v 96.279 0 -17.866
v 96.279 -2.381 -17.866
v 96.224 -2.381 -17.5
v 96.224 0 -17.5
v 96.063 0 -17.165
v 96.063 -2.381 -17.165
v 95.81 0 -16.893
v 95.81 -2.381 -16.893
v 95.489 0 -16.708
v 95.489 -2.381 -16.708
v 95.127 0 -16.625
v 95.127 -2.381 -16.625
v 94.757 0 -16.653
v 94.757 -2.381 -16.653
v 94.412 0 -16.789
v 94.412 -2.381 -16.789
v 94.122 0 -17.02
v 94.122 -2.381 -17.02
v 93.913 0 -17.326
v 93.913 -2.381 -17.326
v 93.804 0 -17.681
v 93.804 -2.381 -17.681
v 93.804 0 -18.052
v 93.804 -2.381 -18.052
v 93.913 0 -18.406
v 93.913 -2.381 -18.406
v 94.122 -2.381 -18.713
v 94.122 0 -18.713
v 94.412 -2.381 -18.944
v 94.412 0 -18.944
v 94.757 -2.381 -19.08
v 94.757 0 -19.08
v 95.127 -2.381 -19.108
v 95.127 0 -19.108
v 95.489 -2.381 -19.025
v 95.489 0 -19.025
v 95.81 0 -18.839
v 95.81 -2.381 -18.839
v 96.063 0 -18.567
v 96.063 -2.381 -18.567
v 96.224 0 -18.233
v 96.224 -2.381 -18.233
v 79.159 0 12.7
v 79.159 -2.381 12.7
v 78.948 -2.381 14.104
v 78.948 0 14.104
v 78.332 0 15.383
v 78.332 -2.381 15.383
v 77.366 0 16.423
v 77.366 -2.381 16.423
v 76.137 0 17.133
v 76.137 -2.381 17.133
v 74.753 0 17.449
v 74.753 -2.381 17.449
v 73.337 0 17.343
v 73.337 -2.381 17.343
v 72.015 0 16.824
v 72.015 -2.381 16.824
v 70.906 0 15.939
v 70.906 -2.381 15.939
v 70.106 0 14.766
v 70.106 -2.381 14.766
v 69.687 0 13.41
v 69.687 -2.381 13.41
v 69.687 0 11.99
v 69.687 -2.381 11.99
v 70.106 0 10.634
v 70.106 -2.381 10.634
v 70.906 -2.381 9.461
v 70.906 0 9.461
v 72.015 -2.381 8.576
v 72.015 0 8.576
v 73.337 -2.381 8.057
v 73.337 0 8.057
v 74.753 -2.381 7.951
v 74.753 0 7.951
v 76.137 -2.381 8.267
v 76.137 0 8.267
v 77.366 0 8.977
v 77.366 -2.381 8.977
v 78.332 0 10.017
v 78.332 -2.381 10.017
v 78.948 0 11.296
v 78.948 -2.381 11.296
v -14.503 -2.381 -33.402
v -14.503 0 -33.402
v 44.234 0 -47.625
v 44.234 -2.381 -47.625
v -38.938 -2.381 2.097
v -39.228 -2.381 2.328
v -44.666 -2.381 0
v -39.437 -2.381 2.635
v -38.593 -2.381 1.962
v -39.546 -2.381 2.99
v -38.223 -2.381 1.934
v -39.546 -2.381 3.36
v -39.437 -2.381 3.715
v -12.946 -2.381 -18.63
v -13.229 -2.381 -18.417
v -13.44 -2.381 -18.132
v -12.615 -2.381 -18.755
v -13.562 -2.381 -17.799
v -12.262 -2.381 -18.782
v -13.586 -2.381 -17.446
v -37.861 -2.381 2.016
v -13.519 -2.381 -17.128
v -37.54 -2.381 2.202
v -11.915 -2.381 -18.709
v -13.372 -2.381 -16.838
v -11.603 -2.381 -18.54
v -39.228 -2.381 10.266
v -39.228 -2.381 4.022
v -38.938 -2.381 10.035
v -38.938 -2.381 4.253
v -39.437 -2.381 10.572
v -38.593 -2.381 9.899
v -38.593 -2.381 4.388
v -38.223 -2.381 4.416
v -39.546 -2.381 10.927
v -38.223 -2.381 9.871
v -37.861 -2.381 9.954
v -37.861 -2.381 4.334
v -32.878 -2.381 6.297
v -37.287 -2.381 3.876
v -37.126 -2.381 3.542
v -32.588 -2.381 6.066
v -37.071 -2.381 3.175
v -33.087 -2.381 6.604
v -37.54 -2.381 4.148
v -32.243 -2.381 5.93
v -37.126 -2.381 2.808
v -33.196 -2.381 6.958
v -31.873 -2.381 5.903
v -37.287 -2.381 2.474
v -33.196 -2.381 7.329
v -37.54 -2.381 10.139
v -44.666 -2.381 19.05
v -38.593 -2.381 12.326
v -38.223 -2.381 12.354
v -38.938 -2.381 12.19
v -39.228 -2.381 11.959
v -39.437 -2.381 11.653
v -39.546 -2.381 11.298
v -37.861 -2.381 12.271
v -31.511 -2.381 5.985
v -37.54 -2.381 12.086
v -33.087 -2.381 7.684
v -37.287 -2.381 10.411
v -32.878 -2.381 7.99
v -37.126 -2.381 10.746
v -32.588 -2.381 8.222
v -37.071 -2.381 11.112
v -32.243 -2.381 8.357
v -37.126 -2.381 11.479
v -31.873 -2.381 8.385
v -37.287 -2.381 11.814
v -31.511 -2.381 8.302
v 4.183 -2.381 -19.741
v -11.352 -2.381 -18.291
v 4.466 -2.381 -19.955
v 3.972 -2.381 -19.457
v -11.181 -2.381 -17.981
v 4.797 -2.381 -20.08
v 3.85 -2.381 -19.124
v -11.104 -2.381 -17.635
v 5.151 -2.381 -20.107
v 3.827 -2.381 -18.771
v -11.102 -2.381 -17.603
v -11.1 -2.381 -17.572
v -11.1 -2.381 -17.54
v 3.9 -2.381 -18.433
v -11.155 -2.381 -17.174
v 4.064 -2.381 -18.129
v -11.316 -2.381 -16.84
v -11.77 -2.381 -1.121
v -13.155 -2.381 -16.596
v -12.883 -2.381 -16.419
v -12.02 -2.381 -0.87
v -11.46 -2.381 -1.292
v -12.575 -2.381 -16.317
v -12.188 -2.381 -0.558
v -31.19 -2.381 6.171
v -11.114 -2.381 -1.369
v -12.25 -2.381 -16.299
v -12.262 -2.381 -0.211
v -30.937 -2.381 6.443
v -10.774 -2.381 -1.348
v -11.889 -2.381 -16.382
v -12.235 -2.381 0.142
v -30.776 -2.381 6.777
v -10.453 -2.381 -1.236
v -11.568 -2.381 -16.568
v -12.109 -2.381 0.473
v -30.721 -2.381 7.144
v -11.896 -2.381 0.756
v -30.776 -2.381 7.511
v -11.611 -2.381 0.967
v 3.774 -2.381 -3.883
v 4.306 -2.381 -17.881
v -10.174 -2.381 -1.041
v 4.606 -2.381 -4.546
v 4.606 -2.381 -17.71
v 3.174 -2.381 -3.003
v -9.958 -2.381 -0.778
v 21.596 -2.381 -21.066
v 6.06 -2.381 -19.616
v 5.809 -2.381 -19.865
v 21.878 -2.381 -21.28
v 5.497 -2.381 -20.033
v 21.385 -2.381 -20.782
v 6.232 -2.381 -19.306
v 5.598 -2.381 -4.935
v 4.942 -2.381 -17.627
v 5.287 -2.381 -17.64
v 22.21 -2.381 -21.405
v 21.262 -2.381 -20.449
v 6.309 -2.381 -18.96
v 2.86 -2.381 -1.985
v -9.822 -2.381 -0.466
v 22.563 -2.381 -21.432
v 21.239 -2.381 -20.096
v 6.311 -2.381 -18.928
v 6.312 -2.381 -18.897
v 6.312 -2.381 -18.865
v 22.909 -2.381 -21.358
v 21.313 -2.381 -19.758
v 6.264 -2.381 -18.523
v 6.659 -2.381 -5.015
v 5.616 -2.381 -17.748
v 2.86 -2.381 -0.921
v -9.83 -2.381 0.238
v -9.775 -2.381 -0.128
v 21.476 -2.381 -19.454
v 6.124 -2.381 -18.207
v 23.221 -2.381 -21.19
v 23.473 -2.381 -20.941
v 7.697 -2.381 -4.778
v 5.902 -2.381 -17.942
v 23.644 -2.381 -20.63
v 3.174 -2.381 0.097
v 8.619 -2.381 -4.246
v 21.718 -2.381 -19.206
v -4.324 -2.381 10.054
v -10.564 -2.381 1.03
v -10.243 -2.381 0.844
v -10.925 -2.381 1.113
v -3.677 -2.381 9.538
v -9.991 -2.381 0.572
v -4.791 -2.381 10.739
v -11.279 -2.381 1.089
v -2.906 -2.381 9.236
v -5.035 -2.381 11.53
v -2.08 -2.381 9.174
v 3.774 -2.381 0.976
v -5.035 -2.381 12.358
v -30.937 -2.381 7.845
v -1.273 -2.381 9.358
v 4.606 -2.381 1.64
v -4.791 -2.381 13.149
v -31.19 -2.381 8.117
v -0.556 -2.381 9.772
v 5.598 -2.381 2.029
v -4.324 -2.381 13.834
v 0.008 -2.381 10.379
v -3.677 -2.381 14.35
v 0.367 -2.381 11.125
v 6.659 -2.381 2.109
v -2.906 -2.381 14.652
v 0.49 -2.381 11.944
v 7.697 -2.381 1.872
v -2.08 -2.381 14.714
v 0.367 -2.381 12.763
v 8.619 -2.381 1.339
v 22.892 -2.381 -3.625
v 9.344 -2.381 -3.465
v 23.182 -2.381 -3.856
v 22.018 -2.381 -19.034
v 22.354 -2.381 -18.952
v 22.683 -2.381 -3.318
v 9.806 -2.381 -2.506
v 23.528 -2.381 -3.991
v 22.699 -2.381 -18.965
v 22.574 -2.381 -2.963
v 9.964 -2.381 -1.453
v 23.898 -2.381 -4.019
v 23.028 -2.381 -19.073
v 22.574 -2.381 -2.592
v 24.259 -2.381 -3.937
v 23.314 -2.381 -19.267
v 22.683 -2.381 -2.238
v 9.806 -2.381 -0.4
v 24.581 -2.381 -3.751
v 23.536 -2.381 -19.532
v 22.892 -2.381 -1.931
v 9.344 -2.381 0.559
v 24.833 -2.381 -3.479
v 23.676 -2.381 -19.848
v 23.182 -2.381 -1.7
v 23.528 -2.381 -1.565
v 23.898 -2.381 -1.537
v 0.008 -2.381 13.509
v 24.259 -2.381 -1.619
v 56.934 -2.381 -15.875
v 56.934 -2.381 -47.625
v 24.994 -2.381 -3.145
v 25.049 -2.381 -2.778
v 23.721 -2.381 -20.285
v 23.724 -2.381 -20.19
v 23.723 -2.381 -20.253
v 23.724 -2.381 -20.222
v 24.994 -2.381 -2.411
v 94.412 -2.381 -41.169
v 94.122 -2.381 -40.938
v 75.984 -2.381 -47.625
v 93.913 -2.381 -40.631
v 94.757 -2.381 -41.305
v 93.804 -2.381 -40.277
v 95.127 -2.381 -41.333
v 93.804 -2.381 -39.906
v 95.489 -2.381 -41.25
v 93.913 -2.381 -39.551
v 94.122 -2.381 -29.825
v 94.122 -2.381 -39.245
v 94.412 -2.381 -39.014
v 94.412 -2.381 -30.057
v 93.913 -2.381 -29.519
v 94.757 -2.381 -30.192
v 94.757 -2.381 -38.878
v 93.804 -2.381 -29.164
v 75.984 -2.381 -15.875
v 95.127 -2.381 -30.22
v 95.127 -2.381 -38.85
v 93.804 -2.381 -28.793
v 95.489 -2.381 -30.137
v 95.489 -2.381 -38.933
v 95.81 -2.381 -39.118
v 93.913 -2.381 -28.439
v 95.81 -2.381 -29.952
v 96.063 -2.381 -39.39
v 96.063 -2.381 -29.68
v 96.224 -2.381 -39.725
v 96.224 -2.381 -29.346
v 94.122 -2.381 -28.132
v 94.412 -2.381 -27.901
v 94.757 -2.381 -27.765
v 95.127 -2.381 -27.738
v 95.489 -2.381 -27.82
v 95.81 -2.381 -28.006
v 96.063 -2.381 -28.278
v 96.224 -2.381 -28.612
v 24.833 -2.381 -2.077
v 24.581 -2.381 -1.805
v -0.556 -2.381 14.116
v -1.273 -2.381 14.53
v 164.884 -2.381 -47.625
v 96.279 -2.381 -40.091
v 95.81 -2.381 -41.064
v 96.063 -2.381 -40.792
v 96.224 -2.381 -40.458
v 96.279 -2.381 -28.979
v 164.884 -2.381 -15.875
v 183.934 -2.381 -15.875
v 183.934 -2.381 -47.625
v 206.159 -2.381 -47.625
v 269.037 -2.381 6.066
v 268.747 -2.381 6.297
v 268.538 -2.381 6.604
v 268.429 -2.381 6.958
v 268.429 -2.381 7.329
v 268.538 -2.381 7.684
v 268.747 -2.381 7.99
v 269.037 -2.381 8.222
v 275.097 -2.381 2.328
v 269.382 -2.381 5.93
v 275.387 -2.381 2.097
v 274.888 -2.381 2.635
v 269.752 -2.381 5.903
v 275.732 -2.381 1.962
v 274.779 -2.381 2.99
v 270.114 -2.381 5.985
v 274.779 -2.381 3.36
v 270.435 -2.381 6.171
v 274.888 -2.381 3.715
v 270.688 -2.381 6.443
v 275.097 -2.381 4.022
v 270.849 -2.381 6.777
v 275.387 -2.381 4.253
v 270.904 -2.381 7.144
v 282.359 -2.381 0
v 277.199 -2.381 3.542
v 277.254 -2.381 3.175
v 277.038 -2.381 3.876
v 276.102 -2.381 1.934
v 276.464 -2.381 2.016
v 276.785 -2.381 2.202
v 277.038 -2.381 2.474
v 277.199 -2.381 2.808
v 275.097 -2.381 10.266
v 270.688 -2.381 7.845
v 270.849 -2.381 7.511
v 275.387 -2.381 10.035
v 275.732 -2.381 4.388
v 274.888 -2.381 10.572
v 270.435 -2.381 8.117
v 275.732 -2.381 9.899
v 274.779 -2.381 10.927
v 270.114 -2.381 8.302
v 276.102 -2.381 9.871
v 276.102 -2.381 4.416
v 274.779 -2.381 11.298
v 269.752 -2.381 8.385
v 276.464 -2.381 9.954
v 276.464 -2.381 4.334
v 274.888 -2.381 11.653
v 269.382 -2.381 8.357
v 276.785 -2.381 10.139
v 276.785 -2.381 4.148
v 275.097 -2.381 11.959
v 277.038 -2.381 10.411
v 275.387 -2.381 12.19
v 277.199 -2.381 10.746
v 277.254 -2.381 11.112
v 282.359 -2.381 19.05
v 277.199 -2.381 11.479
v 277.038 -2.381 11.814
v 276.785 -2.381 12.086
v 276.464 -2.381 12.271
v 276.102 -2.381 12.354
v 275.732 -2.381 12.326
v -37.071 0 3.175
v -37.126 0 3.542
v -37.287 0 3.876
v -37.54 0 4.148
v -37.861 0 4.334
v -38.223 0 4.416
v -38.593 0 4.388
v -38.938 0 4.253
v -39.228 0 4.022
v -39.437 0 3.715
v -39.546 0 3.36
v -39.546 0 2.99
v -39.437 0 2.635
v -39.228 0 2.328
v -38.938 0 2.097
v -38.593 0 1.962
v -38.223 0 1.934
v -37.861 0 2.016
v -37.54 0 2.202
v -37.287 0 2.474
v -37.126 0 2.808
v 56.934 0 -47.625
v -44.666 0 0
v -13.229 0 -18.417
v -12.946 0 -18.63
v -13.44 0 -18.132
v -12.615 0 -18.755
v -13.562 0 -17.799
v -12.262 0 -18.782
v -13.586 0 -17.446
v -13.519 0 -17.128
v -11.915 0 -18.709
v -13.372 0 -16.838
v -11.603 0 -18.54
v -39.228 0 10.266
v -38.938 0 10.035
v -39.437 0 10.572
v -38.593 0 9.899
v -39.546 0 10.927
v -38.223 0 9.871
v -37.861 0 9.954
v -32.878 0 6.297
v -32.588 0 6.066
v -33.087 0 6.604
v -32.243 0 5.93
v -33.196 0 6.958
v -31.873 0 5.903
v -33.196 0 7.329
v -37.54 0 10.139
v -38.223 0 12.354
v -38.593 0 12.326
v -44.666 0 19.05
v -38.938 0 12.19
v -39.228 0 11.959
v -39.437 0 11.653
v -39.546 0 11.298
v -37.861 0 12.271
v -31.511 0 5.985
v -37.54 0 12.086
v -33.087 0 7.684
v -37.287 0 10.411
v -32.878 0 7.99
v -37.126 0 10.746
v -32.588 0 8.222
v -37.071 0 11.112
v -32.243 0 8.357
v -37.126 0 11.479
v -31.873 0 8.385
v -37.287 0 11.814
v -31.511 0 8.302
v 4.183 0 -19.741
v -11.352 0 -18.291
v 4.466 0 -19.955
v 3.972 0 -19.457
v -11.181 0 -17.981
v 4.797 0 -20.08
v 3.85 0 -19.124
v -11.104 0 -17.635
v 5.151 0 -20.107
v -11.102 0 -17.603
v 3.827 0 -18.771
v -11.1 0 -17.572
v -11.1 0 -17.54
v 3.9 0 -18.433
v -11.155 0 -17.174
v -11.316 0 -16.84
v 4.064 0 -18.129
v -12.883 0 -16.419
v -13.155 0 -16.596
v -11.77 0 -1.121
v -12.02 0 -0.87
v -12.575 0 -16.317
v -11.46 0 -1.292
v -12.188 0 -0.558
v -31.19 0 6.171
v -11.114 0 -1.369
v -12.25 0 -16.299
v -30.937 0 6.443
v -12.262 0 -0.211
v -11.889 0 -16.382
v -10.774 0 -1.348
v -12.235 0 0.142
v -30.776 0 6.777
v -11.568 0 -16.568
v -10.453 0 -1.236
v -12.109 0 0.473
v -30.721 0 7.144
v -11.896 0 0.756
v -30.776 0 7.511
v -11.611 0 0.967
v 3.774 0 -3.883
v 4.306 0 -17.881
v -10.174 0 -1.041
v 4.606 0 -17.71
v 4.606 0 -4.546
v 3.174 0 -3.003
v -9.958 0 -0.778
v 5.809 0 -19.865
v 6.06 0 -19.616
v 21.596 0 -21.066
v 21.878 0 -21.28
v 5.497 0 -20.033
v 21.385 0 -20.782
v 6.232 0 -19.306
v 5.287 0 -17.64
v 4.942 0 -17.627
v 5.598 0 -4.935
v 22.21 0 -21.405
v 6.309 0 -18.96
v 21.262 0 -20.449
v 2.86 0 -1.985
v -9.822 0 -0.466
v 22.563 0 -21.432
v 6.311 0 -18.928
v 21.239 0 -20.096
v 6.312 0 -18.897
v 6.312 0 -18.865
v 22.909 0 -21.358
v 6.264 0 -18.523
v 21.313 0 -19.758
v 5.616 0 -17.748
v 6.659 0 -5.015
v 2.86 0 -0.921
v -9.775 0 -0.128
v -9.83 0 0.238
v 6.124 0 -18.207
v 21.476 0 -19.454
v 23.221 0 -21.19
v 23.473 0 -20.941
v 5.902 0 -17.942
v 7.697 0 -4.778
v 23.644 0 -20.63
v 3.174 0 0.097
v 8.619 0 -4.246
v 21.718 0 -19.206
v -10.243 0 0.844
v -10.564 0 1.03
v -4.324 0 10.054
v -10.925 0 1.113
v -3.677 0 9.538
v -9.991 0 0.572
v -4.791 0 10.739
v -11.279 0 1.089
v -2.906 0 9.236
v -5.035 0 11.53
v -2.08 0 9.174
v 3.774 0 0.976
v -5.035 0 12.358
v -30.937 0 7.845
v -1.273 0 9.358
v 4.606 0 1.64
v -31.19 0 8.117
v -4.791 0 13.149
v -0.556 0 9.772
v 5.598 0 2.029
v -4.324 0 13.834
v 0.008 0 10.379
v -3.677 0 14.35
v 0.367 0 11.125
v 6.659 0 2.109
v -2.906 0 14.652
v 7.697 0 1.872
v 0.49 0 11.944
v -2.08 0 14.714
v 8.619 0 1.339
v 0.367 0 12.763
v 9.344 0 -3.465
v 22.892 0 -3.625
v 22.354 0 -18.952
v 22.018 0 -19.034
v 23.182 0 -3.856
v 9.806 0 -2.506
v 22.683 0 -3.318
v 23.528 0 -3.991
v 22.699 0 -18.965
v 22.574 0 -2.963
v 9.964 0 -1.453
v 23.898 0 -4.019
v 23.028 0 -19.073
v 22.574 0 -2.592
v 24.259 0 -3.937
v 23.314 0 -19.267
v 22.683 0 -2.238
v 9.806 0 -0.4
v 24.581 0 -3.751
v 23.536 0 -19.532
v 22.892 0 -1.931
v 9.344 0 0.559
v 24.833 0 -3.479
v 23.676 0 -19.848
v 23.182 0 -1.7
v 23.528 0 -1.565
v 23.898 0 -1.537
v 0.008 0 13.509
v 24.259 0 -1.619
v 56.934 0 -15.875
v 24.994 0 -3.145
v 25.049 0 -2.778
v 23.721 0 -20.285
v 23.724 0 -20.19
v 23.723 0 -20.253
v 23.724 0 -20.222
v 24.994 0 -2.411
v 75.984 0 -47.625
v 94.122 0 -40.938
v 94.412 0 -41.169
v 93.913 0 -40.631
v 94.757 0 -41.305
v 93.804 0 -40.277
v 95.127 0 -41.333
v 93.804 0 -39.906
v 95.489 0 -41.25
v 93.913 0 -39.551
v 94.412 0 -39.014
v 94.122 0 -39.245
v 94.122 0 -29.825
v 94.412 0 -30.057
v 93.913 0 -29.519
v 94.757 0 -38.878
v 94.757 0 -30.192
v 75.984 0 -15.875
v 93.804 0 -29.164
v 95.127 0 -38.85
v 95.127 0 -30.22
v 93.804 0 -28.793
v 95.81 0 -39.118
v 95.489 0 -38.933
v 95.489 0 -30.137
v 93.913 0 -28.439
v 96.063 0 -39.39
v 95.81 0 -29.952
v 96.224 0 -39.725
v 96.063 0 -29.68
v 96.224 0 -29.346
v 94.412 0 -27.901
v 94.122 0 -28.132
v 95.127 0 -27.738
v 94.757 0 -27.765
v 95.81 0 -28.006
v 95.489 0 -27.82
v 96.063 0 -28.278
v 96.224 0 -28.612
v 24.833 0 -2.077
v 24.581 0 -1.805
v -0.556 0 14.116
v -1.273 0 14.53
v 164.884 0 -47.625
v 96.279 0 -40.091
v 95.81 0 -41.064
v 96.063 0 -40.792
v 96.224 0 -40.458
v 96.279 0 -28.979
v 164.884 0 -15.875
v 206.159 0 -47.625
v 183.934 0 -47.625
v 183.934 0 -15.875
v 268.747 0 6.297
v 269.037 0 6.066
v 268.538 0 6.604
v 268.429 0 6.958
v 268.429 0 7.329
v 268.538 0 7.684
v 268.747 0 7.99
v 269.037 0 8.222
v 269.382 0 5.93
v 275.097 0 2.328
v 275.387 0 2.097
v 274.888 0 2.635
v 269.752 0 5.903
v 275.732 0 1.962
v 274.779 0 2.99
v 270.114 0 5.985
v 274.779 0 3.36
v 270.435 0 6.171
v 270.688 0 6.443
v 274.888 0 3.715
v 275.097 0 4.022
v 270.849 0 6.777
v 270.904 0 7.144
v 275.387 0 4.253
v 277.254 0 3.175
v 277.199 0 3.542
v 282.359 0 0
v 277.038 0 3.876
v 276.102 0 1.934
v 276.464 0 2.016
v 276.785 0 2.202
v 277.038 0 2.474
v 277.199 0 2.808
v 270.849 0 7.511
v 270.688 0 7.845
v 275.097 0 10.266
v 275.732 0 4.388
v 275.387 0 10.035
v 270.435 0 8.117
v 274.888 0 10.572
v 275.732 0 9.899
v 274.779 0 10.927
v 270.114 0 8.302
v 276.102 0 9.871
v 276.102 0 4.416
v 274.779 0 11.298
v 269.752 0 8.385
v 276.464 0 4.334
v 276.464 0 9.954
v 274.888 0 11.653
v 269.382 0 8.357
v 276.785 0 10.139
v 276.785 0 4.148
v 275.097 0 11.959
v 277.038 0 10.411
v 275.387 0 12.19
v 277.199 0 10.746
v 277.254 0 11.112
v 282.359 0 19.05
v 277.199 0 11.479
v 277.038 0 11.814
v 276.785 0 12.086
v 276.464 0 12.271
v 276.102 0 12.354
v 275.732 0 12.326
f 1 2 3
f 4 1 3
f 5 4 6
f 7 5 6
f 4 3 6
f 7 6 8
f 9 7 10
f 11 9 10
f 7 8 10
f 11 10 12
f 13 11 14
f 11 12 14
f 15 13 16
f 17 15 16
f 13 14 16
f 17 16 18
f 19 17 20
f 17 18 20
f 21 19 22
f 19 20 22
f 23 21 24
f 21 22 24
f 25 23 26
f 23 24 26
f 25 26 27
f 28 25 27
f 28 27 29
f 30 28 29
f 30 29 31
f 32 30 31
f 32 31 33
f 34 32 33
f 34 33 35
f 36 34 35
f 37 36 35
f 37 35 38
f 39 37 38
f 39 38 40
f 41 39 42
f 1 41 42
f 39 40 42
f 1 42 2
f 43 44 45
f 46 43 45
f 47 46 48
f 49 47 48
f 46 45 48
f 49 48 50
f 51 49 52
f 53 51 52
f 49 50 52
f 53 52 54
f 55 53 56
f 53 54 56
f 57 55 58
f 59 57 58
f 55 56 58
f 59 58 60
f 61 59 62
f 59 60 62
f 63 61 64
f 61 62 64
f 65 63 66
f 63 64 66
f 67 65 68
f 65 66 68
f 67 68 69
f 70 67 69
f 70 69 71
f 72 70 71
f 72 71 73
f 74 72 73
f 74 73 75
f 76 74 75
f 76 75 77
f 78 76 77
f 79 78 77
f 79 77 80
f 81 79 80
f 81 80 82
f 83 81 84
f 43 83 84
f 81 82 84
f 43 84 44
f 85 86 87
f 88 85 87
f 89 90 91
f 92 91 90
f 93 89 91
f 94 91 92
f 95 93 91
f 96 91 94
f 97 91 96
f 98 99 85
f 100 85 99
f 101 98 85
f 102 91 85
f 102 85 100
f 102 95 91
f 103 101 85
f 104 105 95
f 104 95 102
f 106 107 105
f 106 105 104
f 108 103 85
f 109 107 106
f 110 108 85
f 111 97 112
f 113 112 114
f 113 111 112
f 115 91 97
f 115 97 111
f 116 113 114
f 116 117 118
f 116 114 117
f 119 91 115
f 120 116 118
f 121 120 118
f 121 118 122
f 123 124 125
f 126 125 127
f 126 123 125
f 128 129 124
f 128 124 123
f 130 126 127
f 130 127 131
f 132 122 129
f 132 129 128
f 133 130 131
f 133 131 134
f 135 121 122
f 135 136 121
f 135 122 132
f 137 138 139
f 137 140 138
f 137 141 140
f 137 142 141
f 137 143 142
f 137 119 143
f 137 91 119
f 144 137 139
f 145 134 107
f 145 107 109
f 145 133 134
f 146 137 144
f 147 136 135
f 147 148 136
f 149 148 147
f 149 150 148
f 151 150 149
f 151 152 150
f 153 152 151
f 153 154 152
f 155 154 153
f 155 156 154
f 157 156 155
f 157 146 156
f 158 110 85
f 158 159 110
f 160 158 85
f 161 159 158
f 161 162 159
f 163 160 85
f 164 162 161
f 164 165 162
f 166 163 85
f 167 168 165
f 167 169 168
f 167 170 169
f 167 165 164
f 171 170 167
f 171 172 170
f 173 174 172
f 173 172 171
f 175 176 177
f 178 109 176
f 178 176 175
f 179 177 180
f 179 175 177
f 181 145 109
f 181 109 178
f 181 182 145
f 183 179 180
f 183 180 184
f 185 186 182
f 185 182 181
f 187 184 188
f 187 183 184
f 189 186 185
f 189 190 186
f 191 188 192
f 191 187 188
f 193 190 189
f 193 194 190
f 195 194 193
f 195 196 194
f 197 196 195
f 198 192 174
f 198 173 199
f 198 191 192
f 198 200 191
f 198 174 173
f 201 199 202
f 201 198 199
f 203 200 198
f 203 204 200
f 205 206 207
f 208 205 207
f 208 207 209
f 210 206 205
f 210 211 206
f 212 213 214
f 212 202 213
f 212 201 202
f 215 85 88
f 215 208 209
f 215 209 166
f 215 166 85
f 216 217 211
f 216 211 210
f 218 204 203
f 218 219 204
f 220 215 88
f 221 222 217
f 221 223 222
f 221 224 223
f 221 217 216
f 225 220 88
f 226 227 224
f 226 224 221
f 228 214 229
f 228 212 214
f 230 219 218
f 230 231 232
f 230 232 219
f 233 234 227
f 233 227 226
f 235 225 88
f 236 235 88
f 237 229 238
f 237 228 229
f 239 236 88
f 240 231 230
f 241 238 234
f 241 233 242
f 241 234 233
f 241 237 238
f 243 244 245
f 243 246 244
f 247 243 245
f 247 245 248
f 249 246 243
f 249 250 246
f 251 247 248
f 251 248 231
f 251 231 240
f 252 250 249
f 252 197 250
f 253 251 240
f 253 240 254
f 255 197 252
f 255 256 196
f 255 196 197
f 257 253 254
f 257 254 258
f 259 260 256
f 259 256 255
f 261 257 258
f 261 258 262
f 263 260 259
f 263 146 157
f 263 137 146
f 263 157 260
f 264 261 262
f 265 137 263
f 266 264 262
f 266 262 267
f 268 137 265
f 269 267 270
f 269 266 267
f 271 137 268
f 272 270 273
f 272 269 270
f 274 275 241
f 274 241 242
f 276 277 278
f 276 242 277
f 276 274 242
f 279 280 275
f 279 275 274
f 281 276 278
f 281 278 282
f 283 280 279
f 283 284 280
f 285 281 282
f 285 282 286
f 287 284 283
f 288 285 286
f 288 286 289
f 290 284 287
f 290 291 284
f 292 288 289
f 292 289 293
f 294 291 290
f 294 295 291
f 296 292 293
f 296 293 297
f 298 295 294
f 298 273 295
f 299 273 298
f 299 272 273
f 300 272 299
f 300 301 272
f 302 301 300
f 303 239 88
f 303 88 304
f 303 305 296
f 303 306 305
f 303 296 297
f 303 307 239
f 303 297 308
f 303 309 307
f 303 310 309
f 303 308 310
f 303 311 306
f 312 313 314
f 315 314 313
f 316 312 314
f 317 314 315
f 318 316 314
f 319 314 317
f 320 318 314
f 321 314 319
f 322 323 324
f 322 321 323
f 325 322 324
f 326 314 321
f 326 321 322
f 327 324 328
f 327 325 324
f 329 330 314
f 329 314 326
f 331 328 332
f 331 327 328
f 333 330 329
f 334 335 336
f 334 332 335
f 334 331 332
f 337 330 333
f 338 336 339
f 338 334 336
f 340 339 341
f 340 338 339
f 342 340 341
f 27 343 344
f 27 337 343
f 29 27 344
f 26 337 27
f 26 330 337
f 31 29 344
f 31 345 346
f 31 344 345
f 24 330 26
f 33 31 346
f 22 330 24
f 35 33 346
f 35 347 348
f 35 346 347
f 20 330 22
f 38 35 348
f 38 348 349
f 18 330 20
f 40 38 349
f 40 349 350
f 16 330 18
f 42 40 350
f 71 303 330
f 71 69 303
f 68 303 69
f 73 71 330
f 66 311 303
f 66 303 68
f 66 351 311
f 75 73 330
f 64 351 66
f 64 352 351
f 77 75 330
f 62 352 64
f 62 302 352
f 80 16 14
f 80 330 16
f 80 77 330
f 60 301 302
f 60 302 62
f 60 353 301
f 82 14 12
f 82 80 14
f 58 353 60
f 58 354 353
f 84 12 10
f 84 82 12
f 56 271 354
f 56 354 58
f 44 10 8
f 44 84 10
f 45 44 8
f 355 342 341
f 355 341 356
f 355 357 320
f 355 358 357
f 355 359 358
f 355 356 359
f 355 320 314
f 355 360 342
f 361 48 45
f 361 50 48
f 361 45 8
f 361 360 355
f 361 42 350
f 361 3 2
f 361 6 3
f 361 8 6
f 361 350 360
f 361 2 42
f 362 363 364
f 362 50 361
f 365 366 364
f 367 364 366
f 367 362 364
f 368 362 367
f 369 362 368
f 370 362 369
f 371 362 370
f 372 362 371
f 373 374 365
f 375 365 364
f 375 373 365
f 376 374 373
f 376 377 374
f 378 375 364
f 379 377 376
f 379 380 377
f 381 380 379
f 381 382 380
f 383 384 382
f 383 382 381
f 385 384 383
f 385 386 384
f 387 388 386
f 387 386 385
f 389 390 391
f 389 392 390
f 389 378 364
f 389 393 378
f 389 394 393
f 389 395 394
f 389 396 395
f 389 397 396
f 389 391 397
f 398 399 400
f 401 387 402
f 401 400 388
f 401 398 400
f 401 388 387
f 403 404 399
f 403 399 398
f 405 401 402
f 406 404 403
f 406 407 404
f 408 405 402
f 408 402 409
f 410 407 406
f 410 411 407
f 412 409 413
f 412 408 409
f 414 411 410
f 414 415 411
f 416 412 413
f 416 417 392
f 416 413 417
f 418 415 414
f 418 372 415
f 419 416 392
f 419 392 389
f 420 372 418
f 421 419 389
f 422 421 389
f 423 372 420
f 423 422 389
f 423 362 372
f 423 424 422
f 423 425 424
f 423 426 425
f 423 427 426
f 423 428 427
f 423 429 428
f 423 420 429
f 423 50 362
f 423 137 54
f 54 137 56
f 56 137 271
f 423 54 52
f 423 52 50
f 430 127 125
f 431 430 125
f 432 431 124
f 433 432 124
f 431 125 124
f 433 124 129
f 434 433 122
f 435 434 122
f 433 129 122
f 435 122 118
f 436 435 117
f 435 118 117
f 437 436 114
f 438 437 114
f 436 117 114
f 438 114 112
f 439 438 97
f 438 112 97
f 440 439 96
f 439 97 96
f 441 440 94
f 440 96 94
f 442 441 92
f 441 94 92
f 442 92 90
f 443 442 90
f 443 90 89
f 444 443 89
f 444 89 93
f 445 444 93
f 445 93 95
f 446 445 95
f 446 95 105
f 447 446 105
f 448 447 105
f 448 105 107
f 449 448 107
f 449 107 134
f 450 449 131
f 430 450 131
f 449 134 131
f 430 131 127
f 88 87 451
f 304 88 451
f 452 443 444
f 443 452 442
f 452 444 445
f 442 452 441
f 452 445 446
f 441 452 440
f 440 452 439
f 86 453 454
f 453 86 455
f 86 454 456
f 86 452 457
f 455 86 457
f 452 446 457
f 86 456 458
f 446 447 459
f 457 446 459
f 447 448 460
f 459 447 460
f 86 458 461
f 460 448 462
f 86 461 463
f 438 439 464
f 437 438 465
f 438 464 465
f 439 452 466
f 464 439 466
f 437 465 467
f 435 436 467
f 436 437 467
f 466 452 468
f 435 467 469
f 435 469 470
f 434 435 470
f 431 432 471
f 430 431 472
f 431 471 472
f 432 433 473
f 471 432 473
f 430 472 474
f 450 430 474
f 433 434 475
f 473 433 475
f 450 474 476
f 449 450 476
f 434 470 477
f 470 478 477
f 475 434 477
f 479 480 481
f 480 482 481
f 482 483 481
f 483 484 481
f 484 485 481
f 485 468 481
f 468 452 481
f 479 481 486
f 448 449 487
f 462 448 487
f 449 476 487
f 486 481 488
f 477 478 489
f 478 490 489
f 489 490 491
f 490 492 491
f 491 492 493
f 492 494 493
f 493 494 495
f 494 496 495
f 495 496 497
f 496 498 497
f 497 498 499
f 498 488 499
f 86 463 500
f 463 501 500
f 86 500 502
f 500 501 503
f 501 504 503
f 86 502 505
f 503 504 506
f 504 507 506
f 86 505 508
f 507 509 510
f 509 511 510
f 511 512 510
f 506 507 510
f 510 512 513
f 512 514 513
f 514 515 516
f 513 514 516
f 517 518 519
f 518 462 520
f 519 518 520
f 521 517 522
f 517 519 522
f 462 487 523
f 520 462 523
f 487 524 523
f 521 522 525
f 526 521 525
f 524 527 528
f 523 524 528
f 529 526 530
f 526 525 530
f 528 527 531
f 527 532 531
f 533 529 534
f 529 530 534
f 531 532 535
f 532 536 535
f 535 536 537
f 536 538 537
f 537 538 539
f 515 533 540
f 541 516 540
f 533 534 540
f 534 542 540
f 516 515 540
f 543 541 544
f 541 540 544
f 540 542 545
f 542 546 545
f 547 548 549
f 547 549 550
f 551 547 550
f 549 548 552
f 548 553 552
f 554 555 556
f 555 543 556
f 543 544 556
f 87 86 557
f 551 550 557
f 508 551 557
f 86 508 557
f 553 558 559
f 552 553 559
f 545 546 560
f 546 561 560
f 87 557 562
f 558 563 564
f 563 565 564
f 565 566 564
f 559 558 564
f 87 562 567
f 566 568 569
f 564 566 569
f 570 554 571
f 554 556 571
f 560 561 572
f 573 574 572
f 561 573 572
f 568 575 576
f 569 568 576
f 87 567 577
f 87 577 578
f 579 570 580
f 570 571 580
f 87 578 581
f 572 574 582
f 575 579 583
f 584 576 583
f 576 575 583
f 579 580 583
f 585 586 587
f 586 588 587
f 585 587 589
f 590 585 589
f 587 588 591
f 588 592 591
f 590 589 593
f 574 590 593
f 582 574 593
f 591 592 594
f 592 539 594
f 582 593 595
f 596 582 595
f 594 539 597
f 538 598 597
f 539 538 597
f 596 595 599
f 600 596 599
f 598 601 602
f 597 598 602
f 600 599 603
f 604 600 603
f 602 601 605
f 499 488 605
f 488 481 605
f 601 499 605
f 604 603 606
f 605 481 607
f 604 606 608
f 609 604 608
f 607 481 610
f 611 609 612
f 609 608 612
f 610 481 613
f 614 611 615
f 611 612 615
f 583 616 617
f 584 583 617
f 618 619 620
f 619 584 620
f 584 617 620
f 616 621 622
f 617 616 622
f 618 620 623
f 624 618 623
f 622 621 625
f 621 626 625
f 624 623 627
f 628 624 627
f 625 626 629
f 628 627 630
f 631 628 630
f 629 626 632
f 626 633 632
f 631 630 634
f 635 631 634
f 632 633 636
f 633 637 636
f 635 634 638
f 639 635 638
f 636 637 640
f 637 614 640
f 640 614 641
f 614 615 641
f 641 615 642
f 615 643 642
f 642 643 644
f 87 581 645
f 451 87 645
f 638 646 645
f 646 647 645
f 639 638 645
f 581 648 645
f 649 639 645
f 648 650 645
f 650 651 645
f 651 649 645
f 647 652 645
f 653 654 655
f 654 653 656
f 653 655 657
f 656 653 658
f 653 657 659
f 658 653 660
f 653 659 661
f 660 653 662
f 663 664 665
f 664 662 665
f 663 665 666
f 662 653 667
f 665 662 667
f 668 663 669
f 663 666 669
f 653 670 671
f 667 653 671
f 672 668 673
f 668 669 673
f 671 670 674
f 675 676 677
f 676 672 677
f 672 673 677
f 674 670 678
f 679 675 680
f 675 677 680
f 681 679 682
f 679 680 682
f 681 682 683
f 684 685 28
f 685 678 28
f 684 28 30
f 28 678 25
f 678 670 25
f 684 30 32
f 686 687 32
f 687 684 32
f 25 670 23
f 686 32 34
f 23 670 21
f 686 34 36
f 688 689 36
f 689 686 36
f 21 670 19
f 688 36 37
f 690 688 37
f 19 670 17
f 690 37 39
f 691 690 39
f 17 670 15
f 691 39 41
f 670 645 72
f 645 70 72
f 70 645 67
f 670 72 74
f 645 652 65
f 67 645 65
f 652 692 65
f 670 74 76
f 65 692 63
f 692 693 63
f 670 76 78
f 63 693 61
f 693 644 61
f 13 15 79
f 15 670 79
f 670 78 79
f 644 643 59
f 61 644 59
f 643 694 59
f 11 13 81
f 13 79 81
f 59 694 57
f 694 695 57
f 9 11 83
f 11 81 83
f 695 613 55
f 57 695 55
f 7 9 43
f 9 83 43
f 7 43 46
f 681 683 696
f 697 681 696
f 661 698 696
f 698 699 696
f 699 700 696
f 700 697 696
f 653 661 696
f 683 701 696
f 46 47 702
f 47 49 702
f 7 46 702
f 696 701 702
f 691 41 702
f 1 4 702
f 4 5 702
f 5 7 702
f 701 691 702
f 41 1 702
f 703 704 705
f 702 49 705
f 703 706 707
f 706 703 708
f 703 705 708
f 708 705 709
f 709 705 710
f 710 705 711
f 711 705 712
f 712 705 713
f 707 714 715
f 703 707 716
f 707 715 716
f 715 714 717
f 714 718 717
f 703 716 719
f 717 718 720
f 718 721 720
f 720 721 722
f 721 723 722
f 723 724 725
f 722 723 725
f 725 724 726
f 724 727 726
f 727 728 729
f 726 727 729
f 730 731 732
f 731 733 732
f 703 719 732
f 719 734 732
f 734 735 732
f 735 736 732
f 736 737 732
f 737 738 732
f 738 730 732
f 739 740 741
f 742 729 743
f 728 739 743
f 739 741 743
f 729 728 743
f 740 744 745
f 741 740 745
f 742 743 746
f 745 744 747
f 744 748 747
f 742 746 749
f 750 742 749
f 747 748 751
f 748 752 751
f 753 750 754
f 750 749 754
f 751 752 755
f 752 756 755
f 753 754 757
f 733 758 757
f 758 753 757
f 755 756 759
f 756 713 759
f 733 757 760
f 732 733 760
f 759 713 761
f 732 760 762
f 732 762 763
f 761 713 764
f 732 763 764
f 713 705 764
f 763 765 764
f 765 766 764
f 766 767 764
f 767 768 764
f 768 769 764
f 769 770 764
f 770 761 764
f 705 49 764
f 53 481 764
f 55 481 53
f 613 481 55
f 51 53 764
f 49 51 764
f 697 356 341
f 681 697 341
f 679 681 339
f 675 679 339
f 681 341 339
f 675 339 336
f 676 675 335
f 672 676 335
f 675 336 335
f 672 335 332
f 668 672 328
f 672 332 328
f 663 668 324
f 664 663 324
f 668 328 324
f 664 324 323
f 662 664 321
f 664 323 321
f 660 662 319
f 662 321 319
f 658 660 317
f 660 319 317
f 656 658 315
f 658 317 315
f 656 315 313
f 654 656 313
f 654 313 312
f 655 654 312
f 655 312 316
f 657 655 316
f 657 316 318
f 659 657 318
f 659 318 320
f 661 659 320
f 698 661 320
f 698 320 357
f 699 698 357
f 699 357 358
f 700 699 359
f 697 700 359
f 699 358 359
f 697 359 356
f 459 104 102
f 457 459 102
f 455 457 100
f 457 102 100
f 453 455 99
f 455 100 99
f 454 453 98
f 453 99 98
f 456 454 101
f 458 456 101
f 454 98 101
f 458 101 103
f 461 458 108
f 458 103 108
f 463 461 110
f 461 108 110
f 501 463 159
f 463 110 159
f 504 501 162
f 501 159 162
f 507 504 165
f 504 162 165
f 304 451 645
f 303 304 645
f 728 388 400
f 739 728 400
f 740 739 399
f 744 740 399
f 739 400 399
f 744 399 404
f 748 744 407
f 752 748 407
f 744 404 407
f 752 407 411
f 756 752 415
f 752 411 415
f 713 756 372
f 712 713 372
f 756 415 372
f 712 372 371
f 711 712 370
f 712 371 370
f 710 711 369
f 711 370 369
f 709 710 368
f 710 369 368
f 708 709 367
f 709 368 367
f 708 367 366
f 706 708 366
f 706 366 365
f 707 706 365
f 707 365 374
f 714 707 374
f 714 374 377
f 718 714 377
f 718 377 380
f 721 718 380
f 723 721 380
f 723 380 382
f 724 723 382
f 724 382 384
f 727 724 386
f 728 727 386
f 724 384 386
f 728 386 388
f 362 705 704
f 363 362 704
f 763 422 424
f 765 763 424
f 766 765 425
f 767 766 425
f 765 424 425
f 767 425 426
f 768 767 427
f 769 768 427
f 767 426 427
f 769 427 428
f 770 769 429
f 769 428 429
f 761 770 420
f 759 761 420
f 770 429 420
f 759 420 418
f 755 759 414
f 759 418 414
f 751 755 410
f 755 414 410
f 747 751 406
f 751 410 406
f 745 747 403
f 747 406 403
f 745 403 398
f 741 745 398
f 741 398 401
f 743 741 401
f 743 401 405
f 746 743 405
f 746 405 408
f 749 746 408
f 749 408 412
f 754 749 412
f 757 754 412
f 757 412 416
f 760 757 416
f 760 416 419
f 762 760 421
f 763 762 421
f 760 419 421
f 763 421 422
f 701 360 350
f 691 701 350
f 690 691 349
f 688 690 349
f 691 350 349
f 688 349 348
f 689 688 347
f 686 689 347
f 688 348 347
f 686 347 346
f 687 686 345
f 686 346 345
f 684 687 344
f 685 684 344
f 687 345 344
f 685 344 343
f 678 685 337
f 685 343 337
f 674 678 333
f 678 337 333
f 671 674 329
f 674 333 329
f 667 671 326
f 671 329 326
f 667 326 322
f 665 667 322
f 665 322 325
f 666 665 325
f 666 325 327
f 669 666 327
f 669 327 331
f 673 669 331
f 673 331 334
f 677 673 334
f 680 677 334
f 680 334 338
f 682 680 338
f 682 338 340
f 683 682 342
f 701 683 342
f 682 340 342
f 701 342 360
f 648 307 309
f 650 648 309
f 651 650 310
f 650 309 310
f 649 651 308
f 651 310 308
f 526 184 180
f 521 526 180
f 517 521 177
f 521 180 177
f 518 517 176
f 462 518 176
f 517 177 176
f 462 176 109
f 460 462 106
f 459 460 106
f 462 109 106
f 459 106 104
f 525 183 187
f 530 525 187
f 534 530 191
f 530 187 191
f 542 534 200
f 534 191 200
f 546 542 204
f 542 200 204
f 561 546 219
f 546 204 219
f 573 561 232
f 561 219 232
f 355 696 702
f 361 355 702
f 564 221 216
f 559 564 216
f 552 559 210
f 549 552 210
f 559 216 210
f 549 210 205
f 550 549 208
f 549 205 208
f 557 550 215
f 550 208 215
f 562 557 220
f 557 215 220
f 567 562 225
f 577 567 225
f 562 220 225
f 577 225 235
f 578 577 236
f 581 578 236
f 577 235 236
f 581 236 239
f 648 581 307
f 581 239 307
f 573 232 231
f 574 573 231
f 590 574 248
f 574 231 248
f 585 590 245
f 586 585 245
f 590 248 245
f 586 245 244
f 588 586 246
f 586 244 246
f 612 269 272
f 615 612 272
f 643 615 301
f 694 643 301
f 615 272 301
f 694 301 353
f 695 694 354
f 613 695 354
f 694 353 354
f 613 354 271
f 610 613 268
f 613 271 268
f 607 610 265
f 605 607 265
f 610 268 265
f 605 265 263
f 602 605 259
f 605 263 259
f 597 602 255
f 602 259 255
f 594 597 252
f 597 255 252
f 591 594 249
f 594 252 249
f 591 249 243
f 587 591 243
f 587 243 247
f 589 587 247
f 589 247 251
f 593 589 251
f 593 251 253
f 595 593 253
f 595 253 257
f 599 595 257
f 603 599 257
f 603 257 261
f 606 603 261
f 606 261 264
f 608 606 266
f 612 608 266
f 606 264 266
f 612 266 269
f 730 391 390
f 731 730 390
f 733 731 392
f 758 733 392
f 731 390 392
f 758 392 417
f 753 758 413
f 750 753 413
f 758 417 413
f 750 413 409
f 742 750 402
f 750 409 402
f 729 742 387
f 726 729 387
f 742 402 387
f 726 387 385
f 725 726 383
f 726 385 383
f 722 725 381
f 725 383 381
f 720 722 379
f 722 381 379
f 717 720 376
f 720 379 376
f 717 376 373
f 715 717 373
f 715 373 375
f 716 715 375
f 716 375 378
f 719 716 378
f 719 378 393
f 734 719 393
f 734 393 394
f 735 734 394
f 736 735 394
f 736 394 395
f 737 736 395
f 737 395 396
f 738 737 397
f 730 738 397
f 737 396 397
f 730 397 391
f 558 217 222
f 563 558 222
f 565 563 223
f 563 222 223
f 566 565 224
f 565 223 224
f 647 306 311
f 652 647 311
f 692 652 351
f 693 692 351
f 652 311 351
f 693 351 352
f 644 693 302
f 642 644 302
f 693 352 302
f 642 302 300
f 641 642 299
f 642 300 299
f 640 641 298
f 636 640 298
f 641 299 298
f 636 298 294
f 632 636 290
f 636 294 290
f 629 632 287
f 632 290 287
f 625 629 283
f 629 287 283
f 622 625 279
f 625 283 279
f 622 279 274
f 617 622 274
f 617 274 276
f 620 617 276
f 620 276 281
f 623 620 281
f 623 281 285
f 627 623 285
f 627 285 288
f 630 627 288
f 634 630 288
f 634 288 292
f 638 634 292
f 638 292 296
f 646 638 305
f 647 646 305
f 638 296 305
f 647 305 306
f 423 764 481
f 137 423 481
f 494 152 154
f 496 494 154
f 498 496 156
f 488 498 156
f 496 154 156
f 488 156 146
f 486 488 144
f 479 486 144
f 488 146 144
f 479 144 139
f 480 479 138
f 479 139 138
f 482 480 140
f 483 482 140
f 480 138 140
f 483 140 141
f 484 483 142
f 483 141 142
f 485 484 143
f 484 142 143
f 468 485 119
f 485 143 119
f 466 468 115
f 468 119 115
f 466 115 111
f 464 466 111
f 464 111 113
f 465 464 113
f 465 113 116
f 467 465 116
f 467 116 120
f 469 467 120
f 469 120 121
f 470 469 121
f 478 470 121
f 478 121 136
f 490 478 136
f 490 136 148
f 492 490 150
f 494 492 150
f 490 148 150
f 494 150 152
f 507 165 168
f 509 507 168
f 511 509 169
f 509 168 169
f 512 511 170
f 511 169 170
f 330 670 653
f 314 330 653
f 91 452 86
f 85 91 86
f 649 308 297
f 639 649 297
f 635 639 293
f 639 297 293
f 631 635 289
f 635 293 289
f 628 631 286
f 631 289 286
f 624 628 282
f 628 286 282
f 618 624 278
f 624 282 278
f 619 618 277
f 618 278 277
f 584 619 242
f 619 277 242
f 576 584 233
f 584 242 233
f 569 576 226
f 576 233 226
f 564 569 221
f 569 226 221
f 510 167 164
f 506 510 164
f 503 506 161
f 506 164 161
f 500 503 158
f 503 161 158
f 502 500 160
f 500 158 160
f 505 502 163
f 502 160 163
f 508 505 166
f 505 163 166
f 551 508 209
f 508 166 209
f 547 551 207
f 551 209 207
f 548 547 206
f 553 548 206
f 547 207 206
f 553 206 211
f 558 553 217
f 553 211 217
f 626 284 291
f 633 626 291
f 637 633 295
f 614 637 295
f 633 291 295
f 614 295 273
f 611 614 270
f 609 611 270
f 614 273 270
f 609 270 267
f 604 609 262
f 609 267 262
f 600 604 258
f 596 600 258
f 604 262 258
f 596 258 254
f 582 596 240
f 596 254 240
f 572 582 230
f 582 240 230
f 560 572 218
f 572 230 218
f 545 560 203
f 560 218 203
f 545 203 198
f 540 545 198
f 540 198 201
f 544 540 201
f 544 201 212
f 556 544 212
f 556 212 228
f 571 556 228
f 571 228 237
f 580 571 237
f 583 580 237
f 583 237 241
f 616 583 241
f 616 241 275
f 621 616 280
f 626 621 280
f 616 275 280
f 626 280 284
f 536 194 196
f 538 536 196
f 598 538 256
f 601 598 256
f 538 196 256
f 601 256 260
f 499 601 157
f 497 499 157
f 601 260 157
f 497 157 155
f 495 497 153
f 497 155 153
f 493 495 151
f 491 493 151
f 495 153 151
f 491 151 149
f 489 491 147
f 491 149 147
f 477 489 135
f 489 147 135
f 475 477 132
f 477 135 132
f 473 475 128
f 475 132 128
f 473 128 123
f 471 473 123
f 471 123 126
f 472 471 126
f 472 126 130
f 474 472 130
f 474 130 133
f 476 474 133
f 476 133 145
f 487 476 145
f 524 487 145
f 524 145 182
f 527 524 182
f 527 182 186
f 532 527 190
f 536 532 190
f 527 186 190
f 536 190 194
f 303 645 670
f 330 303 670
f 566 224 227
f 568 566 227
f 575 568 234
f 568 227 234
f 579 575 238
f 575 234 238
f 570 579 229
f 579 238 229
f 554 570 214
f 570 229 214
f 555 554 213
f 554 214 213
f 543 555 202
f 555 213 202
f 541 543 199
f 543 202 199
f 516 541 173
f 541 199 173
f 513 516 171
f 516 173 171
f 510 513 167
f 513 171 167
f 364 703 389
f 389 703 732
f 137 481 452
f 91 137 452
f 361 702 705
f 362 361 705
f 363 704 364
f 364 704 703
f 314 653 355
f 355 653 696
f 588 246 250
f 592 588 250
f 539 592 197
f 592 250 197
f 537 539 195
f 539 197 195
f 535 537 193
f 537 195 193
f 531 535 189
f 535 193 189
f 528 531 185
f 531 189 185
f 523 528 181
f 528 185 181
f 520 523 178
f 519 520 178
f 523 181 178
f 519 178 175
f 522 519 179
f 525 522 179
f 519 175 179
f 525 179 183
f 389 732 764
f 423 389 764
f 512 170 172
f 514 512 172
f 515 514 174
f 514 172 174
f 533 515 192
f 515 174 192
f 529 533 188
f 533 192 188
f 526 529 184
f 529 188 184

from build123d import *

# Parameters (mm, degrees)
F1_DEPTH = 2.38125
F2_R     = 1.2446
F2_R_2   = 4.7625
F2_R_3   = 3.571875
F2_R_4   = 2.778125
F3_DEPTH = 2.38125


with BuildPart() as f1:
    # F0 (on Front) → F1 (new body)
    with BuildSketch(Plane.XZ):
        Polygon((282.359224, 19.05), (-44.665776, 19.05), (-44.665776, 0), (-14.503276, -33.402232), (44.234224, -47.625), (56.934224, -47.625), (56.934224, -15.875), (75.984224, -15.875), (75.984224, -47.625), (164.884224, -47.625), (164.884224, -15.875), (183.934224, -15.875), (183.934224, -47.625), (206.159224, -47.625), (282.359224, 0), align=None)
    extrude(amount=F1_DEPTH)

    # F2 (on face) → F3 (cut)
    with BuildSketch(Plane.XZ.offset(2.38125)):
        with Locations((276.009224, 11.1125)):
            Circle(F2_R)
        with Locations((276.009224, 3.175)):
            Circle(F2_R)
        with Locations((269.659224, 7.14375)):
            Circle(F2_R)
        with Locations((74.396724, 12.7)):
            Circle(F2_R_2)
        with Locations((95.034224, -17.866384)):
            Circle(F2_R)
        with Locations((95.034224, -28.978884)):
            Circle(F2_R)
        with Locations((95.034224, -40.091384)):
            Circle(F2_R)
        with Locations((-38.315776, 11.1125)):
            Circle(F2_R)
        with Locations((-38.315776, 3.175)):
            Circle(F2_R)
        with Locations((-31.965776, 7.14375)):
            Circle(F2_R)
        with BuildLine():
            ThreePointArc((21.238677, -20.095719), (22.385265, -21.431157), (23.720703, -20.284569))
            Line((23.720703, -20.284569), (21.238677, -20.095719))
        make_face()
        with BuildLine():
            ThreePointArc((-10.925388, 1.112718), (-12.260826, -0.03387), (-11.114238, -1.369308))
            Line((-11.114238, -1.369308), (-10.925388, 1.112718))
        make_face()
        with BuildLine():
            Line((-10.925388, 1.112718), (-11.114238, -1.369308))
            ThreePointArc((-11.114238, -1.369308), (-10.173791, -1.041134), (-9.775213, -0.128295))
            ThreePointArc((-9.775213, -0.128295), (-10.106974, 0.717728), (-10.925388, 1.112718))
        make_face()
        with BuildLine():
            ThreePointArc((-13.585665, -17.446041), (-12.439077, -18.781479), (-11.103639, -17.634891))
            Line((-11.103639, -17.634891), (-12.344652, -17.540466))
            Line((-12.344652, -17.540466), (-13.585665, -17.446041))
        make_face()
        with BuildLine():
            Line((-12.344652, -17.540466), (-11.103639, -17.634891))
            ThreePointArc((-11.103639, -17.634891), (-11.100949, -17.587712), (-11.100052, -17.540466))
            ThreePointArc((-11.100052, -17.540466), (-11.431813, -16.694444), (-12.250227, -16.299453))
            Line((-12.250227, -16.299453), (-12.344652, -17.540466))
        make_face()
        with BuildLine():
            ThreePointArc((3.826506, -18.77088), (4.973094, -20.106318), (6.308532, -18.95973))
            Line((6.308532, -18.95973), (3.826506, -18.77088))
        make_face()
        with BuildLine():
            Line((3.826506, -18.77088), (6.308532, -18.95973))
            ThreePointArc((6.308532, -18.95973), (6.311222, -18.912552), (6.312119, -18.865305))
            ThreePointArc((6.312119, -18.865305), (5.114765, -17.621602), (3.826506, -18.77088))
        make_face()
        with BuildLine():
            Line((21.238677, -20.095719), (23.720703, -20.284569))
            ThreePointArc((23.720703, -20.284569), (23.723393, -20.237391), (23.72429, -20.190144))
            ThreePointArc((23.72429, -20.190144), (22.526937, -18.946441), (21.238677, -20.095719))
        make_face()
        with BuildLine():
            Line((-13.585665, -17.446041), (-12.344652, -17.540466))
            Line((-12.344652, -17.540466), (-12.250227, -16.299453))
            ThreePointArc((-12.250227, -16.299453), (-13.155413, -16.596169), (-13.585665, -17.446041))
        make_face()
        with Locations((23.804529, -2.777973)):
            Circle(F2_R)
        with Locations((6.392358, -1.453134)):
            Circle(F2_R_3)
        with Locations((-2.287686, 11.944013)):
            Circle(F2_R_4)
    extrude(amount=-F3_DEPTH, mode=Mode.SUBTRACT)


solid = f1.part
